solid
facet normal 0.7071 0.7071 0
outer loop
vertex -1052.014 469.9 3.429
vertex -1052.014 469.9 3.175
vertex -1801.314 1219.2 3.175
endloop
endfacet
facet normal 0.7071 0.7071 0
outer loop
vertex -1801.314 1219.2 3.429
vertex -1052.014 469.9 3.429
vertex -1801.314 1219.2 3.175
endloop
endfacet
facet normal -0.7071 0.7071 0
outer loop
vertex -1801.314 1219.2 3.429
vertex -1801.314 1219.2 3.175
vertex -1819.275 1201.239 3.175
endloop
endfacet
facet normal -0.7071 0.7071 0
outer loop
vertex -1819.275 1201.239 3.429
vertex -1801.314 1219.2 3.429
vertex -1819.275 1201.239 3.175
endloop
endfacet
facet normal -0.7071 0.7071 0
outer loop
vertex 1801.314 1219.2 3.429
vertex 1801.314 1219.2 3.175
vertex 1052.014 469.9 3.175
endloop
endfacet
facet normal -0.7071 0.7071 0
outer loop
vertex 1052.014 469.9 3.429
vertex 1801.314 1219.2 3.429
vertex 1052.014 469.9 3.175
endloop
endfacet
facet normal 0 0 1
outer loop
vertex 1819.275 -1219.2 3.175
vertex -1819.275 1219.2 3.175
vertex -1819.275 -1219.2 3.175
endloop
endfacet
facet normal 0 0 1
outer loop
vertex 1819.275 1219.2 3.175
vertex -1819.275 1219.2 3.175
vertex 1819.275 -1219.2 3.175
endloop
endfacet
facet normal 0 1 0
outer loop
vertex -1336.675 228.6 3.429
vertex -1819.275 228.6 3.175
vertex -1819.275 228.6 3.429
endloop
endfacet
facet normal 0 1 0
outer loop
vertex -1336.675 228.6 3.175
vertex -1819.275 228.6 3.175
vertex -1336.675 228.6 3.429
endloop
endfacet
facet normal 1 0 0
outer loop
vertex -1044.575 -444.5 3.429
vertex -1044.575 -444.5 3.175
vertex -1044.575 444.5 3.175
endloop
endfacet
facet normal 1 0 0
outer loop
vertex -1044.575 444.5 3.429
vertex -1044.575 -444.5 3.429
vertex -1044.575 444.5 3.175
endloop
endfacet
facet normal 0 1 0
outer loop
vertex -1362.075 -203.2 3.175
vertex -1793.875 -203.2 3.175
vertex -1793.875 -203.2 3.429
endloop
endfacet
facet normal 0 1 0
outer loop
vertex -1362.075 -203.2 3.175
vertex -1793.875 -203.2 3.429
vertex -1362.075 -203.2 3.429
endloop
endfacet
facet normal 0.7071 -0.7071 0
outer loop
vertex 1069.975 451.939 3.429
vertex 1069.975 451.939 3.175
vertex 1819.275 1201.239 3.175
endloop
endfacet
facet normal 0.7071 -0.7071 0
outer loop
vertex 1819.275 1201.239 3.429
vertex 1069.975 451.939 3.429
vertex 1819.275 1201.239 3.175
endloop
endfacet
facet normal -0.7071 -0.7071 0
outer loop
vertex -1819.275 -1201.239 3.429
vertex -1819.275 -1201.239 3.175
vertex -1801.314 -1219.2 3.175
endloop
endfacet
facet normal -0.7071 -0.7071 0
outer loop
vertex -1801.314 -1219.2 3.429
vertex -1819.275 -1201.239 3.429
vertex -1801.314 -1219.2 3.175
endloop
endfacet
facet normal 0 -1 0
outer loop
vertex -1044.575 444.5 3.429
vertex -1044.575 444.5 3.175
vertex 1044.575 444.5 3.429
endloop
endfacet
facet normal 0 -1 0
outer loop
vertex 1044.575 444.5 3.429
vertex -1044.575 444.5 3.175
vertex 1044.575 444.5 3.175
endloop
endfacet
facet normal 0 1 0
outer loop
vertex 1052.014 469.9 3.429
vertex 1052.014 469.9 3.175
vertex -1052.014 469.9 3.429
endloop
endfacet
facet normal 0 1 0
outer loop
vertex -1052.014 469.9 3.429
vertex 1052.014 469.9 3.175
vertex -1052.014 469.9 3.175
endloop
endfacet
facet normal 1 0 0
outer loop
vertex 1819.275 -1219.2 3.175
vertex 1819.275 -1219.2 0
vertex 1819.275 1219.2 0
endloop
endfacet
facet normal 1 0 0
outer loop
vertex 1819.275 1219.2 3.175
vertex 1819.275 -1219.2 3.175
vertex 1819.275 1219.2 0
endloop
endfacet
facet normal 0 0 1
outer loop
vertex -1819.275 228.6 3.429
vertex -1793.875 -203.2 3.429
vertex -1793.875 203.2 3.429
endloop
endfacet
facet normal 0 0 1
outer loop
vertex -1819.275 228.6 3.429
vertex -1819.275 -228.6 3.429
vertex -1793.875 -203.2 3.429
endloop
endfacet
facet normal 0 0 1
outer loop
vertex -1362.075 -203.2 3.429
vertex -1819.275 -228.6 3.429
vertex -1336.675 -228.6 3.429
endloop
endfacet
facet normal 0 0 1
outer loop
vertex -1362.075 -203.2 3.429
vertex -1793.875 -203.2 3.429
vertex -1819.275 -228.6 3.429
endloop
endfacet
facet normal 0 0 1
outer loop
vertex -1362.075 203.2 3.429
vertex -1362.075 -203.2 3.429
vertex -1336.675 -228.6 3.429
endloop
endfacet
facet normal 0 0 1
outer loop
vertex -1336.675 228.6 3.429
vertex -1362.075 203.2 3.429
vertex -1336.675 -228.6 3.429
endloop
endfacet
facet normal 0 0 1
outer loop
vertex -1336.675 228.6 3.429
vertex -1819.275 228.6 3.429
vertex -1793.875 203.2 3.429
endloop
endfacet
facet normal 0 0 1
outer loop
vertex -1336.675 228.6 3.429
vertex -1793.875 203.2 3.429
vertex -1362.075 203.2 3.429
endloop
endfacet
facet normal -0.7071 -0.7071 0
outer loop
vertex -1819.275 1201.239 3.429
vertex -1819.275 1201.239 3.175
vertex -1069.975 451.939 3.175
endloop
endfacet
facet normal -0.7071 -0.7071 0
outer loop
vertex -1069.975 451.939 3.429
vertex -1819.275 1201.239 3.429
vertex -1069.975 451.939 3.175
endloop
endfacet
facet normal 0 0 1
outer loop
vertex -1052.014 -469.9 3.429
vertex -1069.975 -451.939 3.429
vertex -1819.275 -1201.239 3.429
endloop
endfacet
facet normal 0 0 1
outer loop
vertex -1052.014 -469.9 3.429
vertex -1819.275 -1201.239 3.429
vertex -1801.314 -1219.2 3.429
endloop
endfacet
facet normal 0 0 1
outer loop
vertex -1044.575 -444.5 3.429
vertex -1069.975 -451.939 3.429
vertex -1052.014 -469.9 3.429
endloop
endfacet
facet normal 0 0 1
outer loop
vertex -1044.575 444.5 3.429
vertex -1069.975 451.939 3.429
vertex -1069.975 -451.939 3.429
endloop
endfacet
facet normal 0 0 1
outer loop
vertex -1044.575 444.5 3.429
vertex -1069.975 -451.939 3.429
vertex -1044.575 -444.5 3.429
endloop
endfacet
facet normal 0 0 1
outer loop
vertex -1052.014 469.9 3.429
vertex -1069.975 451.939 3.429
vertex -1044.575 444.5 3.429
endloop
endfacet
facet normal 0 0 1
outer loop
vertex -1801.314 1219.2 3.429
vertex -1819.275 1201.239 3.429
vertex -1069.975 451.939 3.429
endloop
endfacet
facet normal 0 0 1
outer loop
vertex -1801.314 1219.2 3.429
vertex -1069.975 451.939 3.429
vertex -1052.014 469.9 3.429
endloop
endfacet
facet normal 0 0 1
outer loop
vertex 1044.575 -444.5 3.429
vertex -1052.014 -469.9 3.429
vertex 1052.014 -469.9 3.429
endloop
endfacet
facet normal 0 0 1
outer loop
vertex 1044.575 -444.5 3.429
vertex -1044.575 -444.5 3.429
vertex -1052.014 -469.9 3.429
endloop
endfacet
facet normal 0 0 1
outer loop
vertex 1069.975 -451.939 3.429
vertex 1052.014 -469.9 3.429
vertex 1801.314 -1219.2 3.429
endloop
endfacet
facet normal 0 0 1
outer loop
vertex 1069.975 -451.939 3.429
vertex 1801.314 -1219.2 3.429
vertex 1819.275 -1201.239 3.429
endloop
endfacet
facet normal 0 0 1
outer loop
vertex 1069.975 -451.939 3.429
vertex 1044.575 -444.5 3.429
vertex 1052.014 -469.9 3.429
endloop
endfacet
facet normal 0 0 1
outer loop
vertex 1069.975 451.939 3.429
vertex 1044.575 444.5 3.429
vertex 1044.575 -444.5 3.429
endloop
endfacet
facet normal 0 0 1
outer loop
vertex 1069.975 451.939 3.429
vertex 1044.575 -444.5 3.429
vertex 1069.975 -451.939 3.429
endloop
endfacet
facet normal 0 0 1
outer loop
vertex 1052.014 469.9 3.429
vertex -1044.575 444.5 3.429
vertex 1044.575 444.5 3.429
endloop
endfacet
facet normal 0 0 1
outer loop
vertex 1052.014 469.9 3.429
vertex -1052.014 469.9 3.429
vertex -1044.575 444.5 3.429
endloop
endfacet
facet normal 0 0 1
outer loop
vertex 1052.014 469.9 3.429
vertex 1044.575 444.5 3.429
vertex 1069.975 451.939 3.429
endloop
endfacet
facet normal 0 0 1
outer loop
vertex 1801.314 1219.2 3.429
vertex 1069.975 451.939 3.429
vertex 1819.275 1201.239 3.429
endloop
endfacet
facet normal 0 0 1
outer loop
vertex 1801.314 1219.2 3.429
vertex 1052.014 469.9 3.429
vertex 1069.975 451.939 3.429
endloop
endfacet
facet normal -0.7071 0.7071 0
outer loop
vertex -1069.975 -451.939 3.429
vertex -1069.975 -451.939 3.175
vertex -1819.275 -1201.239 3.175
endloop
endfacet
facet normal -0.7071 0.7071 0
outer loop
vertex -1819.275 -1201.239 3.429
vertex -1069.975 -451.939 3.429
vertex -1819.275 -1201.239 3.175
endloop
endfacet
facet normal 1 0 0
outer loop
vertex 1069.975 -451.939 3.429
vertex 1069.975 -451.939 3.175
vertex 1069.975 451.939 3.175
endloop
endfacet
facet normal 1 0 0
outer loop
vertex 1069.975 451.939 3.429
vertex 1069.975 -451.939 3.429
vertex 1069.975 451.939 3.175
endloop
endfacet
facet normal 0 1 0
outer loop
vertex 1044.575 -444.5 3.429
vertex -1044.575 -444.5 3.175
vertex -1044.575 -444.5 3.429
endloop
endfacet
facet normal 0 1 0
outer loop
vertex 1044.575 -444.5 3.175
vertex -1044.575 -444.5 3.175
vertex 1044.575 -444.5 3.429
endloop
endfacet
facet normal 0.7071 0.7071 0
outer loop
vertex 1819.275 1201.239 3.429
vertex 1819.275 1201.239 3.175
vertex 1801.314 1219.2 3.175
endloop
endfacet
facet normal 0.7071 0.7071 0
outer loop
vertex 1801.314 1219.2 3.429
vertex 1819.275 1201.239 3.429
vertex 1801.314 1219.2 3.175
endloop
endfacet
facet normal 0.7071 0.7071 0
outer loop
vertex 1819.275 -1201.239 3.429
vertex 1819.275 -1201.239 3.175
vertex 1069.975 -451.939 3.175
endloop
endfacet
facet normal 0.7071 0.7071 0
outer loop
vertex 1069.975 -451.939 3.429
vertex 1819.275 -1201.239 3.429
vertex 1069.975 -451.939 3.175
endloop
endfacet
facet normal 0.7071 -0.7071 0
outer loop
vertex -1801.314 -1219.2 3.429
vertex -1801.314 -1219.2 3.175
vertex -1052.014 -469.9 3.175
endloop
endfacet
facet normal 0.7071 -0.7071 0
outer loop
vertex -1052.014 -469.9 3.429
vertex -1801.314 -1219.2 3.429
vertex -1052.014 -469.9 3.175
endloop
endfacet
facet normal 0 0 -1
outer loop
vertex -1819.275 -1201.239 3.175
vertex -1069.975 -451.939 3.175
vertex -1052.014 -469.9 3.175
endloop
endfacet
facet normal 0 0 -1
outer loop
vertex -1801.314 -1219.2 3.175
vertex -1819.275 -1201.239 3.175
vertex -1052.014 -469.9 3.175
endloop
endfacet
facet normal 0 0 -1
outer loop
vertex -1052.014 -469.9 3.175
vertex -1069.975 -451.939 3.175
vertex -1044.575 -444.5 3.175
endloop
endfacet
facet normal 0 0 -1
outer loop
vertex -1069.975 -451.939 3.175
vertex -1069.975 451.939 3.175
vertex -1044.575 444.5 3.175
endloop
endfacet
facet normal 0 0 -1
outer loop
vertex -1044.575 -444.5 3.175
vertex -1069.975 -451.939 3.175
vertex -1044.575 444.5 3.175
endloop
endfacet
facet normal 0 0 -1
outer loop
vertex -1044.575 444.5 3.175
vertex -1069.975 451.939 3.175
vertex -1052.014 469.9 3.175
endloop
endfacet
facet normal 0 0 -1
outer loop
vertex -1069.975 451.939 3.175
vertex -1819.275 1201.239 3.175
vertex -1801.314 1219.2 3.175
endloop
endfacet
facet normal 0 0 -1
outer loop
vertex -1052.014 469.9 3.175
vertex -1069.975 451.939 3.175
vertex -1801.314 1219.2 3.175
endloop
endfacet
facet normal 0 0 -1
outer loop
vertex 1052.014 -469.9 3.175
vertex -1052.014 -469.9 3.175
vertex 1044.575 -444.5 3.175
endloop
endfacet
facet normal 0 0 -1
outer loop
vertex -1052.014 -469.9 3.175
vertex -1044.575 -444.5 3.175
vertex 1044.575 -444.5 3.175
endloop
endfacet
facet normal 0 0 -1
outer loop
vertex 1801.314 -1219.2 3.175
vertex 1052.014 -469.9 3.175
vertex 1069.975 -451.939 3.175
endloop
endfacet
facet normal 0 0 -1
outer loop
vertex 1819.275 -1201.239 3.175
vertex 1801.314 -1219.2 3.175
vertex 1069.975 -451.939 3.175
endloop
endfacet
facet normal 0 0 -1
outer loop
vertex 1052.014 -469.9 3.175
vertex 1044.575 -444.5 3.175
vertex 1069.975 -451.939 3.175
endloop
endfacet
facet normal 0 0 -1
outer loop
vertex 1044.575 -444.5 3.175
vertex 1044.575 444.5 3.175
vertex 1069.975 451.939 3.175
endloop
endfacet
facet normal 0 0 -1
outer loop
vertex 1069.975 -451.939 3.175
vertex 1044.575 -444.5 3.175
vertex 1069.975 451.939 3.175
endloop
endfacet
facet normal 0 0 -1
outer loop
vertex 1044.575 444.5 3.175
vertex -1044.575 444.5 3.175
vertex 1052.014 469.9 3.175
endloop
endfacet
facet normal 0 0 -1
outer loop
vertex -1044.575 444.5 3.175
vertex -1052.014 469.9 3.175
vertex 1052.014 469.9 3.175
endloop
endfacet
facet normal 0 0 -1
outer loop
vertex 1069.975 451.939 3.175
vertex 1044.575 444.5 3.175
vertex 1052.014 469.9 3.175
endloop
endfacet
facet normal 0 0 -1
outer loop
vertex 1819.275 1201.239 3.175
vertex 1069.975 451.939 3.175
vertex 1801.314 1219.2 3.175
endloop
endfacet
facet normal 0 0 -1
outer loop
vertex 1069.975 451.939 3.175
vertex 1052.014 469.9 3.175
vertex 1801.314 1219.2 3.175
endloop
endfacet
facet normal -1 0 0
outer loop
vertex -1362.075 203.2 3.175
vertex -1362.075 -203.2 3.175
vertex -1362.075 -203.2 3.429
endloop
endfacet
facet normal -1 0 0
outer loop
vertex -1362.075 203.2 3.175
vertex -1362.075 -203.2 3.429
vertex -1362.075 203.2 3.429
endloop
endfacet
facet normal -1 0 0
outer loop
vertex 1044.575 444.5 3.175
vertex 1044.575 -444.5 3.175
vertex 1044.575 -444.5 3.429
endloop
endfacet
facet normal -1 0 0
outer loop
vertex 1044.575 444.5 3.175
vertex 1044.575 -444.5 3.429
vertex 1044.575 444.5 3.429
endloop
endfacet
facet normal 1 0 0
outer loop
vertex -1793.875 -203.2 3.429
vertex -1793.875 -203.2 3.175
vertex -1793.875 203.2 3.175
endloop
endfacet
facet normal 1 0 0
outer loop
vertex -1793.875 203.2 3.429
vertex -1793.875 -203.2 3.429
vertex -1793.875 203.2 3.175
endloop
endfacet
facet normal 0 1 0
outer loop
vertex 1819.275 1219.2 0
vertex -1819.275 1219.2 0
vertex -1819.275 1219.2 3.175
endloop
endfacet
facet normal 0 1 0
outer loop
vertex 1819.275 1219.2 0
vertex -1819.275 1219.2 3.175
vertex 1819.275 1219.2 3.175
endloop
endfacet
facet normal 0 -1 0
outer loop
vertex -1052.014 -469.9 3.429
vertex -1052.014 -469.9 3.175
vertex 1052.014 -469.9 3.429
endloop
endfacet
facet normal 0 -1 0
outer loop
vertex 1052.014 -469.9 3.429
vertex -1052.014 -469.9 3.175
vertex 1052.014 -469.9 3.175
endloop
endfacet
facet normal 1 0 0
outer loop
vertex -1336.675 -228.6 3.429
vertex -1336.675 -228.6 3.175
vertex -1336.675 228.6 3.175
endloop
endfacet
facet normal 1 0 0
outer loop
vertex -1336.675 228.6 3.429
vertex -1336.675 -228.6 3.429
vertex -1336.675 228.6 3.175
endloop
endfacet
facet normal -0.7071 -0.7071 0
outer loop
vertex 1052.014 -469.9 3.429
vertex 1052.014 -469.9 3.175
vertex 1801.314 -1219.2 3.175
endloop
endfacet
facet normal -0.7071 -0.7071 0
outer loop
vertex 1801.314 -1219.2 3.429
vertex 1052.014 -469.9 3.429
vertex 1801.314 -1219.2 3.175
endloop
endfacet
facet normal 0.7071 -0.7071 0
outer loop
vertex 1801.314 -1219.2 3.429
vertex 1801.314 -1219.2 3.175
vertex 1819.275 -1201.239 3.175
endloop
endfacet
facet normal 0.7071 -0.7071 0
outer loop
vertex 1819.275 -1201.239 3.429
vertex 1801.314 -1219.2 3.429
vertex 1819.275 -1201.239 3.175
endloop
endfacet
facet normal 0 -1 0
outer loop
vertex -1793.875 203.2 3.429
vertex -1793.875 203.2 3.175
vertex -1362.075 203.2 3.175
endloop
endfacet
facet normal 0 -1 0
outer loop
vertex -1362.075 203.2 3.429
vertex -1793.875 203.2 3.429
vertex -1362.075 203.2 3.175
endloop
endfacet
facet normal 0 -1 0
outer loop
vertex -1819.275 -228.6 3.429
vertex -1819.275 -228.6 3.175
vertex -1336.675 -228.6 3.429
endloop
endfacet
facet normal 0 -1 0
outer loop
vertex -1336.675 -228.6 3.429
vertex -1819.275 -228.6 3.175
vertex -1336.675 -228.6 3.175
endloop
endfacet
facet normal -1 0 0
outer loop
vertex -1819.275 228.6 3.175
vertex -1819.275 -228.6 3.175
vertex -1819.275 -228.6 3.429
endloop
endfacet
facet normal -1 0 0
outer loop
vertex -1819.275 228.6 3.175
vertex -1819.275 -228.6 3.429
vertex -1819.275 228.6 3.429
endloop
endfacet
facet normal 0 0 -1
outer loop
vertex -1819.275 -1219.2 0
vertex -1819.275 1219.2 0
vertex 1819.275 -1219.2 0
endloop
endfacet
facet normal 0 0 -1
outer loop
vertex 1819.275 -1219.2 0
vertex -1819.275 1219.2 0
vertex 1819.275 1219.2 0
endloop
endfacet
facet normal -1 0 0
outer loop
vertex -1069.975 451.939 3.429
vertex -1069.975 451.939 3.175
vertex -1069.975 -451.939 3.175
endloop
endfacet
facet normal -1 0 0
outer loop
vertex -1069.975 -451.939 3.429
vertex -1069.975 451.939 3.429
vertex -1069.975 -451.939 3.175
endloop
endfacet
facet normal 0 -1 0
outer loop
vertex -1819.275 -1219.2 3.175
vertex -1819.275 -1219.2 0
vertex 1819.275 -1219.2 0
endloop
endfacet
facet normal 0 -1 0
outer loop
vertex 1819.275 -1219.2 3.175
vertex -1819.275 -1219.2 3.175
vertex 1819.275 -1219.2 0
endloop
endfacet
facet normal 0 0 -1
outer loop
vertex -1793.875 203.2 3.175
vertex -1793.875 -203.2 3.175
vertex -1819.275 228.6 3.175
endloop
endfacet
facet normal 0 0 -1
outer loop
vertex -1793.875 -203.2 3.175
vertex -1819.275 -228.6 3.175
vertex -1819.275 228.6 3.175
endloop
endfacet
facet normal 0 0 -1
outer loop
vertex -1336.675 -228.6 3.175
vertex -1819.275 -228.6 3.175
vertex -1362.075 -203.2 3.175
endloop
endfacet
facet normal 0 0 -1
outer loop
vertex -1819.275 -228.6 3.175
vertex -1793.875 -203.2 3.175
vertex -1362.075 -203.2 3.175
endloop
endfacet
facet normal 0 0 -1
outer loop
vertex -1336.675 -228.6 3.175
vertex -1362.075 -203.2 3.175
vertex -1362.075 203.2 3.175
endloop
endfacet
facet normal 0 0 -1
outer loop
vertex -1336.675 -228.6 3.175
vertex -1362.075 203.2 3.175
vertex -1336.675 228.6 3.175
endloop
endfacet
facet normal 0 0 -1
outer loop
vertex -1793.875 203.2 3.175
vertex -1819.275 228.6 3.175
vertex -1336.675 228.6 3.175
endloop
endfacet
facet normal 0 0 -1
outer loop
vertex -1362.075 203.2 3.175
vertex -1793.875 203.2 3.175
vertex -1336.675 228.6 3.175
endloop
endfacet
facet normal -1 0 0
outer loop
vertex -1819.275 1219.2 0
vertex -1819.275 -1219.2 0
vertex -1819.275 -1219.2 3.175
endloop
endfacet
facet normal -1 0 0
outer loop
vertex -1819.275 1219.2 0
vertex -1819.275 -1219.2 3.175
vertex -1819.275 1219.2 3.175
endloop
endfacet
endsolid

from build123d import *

# Parameters (mm, degrees)
F0_W     = 3638.55
F0_H     = 2438.4
F1_DEPTH = 3.175
F2_W     = 482.6
F2_H     = 457.2
F2_W_2   = 431.8
F2_H_2   = 406.4
F3_DEPTH = 0.254
F4_W     = 2089.15
F4_H     = 889
F5_DEPTH = 0.254


with BuildPart() as f1:
    # F0 (on Top) → F1 (new body)
    with BuildSketch(Plane.XY):
        Rectangle(F0_W, F0_H)
    extrude(amount=F1_DEPTH)


with BuildPart() as f3:
    # F2 (on face) → F3 (new body)
    with BuildSketch(Plane.XY.offset(3.175)):
        with Locations((-1577.975, 0)):
            Rectangle(F2_W, F2_H)
        with Locations((-1577.975, 0)):
            Rectangle(F2_W_2, F2_H_2, mode=Mode.SUBTRACT)
    extrude(amount=F3_DEPTH)


with BuildPart() as f5:
    # F4 (on face) → F5 (new body)
    with BuildSketch(Plane.XY.offset(3.175)):
        Polygon((-1819.275, 1201.239488), (-1069.975, 451.939488), (-1069.975, -451.939488), (-1819.275, -1201.239488), (-1801.314488, -1219.2), (-1052.014488, -469.9), (1052.014488, -469.9), (1801.314488, -1219.2), (1819.275, -1201.239488), (1069.975, -451.939488), (1069.975, 451.939488), (1819.275, 1201.239488), (1801.314488, 1219.2), (1052.014488, 469.9), (-1052.014488, 469.9), (-1801.314488, 1219.2), align=None)
        Rectangle(F4_W, F4_H, mode=Mode.SUBTRACT)
    extrude(amount=F5_DEPTH)


solid = Compound([f1.part, f3.part, f5.part])
